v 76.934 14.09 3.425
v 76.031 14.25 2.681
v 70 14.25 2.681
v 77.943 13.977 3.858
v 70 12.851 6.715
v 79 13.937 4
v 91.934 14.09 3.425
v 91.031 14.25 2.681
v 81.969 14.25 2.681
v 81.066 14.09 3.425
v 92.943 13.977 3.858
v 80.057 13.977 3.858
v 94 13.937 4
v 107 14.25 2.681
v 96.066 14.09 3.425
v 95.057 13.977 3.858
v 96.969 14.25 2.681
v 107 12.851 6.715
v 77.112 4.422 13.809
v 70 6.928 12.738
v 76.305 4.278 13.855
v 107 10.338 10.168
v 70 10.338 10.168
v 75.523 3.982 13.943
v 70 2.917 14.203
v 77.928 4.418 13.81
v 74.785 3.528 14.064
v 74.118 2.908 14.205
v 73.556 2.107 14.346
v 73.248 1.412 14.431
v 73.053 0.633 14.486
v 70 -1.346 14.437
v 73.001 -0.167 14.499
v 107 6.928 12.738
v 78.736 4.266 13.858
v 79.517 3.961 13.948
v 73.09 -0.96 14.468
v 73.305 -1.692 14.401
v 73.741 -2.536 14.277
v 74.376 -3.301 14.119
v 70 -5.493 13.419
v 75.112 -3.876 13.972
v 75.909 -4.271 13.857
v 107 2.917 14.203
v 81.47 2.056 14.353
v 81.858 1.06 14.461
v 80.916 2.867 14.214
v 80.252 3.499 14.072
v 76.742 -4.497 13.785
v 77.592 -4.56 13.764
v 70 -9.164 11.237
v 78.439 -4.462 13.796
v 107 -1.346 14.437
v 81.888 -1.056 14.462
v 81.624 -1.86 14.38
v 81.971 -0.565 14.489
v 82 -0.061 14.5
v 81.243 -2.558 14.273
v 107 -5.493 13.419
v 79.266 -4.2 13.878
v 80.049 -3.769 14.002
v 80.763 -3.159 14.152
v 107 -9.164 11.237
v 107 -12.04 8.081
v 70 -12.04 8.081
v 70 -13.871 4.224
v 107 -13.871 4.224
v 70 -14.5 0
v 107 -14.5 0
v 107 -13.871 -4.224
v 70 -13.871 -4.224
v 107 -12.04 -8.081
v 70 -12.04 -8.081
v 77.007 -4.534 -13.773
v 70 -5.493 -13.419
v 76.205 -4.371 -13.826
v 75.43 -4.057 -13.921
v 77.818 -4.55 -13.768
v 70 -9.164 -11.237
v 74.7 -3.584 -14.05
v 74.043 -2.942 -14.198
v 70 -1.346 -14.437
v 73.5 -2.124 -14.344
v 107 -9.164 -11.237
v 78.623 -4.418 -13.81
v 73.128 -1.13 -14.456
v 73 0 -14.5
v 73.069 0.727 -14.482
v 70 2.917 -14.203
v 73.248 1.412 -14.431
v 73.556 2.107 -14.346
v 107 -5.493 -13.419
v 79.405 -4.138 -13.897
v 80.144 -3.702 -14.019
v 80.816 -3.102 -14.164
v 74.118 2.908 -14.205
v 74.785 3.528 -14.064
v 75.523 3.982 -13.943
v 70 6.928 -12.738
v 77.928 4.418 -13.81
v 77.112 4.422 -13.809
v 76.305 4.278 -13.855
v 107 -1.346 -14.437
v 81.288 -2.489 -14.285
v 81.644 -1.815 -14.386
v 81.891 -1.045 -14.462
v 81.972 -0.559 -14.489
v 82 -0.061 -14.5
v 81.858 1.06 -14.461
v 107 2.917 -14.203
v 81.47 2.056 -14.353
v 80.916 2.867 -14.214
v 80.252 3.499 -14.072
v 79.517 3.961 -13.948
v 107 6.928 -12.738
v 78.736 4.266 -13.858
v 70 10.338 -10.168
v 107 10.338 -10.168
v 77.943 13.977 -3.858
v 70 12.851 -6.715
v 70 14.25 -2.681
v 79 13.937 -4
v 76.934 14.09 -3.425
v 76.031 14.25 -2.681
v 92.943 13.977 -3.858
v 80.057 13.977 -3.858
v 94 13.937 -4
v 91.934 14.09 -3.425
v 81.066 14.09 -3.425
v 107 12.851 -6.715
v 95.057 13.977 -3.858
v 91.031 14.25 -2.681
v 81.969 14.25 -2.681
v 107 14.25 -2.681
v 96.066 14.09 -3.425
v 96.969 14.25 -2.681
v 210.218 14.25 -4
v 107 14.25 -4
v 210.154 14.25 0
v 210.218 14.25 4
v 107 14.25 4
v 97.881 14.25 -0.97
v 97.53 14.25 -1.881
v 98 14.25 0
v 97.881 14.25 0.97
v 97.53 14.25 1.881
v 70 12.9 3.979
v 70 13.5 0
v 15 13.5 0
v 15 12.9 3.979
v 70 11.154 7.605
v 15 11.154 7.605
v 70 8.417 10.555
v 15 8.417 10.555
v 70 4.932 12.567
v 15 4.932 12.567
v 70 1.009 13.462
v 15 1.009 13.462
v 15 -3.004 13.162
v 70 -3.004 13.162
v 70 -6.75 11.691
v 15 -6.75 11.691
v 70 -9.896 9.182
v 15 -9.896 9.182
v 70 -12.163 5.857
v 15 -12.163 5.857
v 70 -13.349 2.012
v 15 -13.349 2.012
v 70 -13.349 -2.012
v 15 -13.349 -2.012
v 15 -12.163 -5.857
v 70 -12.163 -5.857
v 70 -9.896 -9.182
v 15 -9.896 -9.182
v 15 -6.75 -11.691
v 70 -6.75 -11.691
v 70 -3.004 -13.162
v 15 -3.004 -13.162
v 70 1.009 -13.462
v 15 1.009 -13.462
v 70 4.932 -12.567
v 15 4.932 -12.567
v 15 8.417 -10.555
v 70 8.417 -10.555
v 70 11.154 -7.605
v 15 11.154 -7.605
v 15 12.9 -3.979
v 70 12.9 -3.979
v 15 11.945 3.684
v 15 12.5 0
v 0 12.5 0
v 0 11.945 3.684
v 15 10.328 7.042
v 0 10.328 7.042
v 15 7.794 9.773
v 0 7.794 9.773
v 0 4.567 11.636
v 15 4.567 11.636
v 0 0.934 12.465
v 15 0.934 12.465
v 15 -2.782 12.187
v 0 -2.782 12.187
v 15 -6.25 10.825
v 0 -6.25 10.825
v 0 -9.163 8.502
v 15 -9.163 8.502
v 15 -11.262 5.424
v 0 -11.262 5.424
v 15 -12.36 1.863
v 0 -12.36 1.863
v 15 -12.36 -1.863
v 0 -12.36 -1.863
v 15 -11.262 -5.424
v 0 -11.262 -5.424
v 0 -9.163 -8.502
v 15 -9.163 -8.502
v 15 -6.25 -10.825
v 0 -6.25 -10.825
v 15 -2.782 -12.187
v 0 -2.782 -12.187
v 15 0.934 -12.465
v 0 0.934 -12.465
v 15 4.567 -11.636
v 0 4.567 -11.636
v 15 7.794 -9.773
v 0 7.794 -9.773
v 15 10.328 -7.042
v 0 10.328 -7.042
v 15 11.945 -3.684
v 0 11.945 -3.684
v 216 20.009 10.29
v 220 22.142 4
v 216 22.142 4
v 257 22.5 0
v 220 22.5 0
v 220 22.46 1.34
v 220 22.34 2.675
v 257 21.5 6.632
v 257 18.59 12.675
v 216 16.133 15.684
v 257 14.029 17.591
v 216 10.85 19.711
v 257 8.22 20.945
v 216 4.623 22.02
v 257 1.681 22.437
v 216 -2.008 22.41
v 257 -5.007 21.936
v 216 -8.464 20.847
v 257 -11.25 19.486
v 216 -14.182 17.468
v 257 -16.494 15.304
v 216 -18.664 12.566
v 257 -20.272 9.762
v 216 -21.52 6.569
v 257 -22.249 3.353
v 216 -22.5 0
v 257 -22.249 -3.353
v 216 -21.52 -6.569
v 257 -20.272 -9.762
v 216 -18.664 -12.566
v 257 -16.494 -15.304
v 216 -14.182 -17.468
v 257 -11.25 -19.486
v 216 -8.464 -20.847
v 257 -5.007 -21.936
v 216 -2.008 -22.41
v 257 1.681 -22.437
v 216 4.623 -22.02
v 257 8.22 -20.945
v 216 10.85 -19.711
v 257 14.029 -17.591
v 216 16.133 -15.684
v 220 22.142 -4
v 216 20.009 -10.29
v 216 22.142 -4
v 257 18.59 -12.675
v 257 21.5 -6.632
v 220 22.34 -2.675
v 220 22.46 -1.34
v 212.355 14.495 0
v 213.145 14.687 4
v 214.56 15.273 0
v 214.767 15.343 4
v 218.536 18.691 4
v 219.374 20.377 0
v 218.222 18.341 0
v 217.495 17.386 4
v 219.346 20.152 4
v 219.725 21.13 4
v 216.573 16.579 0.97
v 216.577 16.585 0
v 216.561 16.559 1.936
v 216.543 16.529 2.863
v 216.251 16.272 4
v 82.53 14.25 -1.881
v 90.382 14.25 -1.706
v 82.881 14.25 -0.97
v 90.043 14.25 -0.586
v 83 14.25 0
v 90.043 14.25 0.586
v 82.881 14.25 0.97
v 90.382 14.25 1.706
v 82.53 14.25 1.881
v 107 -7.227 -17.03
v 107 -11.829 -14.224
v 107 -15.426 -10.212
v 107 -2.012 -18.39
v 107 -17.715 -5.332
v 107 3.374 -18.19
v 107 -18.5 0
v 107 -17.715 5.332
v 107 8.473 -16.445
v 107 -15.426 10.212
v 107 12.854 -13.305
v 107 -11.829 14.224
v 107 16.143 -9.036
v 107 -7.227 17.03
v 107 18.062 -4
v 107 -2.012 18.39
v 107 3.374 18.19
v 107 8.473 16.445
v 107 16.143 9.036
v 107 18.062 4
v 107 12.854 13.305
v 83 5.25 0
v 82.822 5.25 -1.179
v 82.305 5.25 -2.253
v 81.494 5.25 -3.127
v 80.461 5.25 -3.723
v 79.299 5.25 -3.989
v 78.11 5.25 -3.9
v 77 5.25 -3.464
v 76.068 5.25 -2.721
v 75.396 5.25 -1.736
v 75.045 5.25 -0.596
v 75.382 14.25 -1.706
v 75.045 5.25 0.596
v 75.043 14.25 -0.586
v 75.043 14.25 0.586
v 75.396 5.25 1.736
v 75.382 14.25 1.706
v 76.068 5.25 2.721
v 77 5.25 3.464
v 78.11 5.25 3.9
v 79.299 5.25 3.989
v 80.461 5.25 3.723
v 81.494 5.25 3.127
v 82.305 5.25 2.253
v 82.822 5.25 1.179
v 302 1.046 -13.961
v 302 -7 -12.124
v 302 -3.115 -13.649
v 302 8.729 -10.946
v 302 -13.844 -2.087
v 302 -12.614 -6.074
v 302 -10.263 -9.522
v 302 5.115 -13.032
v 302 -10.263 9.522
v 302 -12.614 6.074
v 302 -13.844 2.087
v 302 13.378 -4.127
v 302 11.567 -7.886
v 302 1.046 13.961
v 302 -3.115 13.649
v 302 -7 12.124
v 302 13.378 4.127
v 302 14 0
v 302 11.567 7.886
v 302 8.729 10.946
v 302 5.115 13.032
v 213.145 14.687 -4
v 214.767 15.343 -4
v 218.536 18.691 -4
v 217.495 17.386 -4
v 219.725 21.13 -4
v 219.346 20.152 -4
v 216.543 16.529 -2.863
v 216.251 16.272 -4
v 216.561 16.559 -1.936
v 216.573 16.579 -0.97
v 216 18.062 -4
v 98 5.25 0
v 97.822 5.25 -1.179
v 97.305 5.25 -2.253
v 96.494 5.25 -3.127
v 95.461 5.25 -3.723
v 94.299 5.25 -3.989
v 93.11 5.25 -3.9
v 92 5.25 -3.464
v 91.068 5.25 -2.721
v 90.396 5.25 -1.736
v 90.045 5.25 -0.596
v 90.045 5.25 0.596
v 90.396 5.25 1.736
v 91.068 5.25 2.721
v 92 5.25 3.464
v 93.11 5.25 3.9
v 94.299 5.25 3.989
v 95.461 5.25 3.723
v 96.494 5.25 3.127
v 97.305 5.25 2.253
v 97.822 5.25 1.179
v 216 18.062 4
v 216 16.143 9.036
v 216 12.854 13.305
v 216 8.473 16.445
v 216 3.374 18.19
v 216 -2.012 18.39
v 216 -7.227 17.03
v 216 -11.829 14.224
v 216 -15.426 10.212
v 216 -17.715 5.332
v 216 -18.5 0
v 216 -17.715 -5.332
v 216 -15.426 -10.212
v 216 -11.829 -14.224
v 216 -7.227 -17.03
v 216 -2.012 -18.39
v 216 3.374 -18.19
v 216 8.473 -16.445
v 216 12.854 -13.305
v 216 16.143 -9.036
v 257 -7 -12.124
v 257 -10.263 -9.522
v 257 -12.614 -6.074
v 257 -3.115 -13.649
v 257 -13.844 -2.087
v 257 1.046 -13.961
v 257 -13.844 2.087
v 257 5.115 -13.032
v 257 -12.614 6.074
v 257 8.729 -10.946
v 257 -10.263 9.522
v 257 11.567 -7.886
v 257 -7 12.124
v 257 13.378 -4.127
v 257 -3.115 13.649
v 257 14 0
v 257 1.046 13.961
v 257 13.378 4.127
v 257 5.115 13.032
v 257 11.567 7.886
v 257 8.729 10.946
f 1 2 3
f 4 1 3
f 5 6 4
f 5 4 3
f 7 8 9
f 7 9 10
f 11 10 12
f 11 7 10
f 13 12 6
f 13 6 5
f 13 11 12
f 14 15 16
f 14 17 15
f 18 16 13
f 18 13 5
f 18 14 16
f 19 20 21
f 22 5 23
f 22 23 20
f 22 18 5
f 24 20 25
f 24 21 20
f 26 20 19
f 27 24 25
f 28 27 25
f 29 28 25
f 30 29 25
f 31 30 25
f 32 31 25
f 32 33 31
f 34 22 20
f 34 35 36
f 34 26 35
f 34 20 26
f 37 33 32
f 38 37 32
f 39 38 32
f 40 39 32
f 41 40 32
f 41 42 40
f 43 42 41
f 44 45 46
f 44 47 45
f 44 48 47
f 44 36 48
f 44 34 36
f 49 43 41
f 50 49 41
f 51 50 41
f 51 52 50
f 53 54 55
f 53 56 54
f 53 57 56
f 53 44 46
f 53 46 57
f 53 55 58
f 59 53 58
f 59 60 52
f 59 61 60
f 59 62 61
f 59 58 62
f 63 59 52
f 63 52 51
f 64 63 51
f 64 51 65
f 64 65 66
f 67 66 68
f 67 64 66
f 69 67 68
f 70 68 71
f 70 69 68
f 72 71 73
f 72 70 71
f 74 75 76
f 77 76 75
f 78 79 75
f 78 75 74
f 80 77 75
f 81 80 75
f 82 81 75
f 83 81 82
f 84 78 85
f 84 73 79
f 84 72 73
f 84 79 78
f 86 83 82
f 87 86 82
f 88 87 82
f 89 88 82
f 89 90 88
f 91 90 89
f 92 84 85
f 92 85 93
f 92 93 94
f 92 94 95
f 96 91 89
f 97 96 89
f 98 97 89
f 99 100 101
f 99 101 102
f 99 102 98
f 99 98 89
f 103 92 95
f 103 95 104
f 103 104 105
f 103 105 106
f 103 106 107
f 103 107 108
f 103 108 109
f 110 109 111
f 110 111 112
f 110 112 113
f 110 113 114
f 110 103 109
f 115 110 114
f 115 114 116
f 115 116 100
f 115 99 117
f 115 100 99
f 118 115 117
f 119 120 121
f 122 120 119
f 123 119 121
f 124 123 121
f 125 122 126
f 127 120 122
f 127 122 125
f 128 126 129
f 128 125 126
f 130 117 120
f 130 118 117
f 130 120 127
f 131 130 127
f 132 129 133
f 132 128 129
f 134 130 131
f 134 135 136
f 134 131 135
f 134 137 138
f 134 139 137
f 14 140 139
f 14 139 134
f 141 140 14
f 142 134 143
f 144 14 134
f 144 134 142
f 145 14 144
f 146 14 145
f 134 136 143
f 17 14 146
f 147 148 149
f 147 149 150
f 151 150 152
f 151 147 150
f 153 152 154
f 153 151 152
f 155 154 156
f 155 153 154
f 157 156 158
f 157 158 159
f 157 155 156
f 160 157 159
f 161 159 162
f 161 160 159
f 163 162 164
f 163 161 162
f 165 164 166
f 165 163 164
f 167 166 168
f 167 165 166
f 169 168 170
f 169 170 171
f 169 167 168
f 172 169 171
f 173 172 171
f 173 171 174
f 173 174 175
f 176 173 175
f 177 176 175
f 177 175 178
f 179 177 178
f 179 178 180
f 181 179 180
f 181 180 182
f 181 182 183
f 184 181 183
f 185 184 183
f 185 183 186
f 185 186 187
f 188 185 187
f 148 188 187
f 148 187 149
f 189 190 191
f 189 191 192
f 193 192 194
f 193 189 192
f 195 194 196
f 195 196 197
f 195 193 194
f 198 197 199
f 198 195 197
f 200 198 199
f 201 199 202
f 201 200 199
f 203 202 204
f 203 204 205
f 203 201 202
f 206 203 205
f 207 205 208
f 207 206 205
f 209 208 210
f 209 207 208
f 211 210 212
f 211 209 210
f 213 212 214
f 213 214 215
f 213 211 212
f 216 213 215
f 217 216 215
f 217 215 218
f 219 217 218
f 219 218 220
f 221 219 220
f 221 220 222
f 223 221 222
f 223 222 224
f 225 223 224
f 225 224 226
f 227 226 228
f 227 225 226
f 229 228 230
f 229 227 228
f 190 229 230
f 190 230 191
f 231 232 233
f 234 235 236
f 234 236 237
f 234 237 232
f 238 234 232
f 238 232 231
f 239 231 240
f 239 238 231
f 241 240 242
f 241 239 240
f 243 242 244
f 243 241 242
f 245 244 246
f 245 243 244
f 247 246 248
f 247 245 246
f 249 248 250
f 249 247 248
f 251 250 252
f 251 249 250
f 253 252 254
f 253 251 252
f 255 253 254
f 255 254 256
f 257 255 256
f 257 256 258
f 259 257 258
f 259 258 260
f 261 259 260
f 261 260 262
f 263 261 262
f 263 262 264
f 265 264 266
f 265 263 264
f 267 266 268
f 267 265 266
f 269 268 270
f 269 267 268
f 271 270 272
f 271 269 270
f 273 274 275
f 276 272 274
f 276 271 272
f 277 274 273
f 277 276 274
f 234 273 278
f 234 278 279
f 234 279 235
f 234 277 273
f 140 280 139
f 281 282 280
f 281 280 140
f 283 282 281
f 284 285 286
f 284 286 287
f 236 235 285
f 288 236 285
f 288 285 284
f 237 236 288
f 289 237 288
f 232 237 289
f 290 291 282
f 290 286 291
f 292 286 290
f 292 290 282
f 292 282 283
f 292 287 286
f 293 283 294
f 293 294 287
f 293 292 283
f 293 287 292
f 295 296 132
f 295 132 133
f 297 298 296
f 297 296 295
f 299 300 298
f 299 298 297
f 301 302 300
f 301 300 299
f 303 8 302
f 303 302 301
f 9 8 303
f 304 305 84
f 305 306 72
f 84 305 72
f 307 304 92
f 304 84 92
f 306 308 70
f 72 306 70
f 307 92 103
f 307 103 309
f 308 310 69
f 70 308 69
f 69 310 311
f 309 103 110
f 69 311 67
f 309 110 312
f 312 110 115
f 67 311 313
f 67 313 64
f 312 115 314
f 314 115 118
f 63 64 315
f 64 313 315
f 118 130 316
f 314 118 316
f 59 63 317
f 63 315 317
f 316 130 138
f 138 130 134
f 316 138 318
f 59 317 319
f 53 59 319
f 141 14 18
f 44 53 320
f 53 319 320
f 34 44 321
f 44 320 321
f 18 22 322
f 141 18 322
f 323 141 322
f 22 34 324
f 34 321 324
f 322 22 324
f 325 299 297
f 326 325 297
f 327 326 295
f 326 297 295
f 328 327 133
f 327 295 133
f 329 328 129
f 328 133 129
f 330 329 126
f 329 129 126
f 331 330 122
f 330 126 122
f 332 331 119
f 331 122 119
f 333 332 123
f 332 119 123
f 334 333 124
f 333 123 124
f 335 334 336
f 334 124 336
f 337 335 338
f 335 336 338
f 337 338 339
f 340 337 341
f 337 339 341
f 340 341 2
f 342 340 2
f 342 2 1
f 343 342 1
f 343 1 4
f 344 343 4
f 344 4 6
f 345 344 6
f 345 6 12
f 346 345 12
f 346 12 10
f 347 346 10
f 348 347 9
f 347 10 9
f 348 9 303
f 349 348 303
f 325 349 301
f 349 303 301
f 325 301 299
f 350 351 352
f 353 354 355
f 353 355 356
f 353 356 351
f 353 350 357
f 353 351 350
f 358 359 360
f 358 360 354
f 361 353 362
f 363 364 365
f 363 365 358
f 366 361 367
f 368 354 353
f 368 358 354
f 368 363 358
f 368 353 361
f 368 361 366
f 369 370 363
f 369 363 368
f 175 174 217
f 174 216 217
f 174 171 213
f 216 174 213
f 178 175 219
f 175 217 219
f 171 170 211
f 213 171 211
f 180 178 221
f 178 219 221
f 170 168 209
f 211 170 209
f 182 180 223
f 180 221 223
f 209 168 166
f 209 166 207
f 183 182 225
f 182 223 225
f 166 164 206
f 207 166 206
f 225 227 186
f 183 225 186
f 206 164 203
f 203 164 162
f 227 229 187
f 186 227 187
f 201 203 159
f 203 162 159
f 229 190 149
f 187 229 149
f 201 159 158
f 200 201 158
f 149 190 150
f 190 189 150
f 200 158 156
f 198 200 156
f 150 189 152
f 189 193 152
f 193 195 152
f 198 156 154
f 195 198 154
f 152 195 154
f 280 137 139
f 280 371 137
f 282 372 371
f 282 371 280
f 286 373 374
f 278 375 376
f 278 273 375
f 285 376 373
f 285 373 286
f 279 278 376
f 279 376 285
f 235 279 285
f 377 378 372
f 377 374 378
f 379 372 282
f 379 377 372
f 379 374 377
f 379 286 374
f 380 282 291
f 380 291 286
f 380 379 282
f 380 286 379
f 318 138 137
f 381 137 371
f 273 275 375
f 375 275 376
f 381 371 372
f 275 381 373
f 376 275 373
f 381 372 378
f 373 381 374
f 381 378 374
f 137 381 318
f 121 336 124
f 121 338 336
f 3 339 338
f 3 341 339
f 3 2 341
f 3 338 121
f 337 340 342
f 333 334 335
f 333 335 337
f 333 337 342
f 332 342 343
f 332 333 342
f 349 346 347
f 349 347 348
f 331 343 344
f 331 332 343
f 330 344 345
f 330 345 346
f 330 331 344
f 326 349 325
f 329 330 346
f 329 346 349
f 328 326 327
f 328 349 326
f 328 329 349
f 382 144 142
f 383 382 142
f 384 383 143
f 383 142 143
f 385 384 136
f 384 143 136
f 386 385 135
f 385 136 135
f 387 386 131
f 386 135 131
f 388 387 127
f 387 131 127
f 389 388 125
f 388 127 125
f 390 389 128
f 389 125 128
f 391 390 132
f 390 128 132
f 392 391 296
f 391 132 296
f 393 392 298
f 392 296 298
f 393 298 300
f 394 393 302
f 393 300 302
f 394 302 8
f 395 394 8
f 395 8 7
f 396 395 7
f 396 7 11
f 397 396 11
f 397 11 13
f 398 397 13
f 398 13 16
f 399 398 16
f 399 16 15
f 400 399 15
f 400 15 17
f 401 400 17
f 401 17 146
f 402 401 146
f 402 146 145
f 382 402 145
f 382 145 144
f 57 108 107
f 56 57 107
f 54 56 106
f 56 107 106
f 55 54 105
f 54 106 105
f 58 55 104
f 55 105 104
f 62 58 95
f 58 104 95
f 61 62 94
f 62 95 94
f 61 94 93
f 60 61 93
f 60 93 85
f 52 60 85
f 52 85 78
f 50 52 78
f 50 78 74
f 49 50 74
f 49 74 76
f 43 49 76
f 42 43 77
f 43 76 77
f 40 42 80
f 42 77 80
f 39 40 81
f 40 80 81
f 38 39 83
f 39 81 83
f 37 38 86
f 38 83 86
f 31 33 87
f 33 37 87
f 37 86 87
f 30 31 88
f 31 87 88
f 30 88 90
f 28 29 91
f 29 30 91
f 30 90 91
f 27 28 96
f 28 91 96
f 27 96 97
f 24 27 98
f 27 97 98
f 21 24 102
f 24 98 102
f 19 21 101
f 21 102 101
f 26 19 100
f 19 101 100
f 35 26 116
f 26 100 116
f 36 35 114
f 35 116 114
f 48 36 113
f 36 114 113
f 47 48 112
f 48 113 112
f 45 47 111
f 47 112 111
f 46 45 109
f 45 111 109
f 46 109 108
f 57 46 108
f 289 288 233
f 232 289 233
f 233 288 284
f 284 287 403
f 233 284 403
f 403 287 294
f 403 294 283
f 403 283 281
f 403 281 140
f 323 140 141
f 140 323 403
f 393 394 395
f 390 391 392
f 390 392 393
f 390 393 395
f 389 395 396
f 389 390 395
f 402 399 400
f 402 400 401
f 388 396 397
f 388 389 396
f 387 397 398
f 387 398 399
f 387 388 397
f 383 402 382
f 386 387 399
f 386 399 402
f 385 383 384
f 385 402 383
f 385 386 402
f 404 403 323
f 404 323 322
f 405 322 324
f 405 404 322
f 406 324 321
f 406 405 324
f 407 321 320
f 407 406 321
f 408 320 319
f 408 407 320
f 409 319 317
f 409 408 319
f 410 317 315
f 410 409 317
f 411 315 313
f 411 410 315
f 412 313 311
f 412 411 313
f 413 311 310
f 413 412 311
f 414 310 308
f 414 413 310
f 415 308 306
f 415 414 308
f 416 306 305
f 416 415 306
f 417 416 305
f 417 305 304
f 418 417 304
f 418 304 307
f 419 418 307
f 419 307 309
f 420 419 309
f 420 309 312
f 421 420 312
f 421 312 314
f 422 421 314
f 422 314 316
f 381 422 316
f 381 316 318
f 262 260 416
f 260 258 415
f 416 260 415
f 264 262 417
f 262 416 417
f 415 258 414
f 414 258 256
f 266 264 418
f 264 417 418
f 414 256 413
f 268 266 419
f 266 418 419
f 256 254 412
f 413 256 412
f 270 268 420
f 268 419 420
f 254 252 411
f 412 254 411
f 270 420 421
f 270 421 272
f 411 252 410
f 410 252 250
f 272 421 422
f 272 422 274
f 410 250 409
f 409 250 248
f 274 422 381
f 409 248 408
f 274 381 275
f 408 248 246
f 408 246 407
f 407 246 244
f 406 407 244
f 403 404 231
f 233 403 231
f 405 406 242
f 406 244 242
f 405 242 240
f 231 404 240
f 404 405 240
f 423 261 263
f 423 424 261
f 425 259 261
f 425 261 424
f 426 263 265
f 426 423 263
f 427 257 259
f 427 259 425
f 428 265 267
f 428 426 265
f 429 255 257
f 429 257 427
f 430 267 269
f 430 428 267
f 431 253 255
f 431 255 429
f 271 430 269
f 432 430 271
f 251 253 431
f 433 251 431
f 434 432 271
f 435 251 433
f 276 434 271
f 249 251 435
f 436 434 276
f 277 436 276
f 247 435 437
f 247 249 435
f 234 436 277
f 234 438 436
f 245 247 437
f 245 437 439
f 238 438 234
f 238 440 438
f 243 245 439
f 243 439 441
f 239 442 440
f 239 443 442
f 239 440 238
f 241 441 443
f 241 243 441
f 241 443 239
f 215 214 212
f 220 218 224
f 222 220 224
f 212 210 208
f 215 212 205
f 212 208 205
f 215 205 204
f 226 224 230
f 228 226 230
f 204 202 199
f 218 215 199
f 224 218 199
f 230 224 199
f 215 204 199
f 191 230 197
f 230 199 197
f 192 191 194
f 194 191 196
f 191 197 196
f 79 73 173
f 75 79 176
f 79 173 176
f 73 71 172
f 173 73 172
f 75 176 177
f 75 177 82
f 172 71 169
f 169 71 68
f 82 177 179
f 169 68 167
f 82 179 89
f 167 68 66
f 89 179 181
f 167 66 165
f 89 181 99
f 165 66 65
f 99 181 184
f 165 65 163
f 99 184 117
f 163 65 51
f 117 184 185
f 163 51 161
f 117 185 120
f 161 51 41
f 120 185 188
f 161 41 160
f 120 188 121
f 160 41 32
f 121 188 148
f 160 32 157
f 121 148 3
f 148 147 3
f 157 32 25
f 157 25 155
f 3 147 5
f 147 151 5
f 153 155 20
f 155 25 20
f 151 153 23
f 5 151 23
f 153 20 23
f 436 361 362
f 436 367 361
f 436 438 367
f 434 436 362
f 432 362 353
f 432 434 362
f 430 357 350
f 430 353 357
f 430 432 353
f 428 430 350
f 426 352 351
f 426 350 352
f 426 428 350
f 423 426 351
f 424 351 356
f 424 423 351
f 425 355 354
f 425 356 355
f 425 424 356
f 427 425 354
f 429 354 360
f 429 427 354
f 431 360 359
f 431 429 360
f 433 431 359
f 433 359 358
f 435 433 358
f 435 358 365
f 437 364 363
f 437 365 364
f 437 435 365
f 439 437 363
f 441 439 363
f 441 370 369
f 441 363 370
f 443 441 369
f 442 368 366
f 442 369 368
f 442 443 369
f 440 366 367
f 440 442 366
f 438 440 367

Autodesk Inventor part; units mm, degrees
sketch "Sketch1" plane through (0, 0, 0) normal (0, 0, 1) x (1, 0, 0)
  line L0 (0, 0) -> (302, 0)
  line L1 (0, 0) -> (0, 12.5)
  line L2 (0, 12.5) -> (15, 12.5)
  line L3 (15, 12.5) -> (15, 13.5)
  line L4 (15, 13.5) -> (70, 13.5)
  line L5 (70, 13.5) -> (70, 14.5)
  line L6 (70, 14.5) -> (107, 14.5)
  line L7 (107, 14.5) -> (107, 18.5)
  line L8 (107, 18.5) -> (216, 18.5)
  line L9 (216, 18.5) -> (216, 22.5)
  line L10 (302, 0) -> (302, 14)
  line L11 (302, 14) -> (257, 14)
  line L12 (216, 22.5) -> (257, 22.5)
  line L13 (257, 22.5) -> (257, 14)
  dimension "d0" = 302
  dimension "d1" = 12.5
  dimension "d2" = 15
  dimension "d3" = 1
  dimension "d4" = 55
  dimension "d5" = 1
  dimension "d6" = 37
  dimension "d7" = 4
  dimension "d8" = 109
  dimension "d9" = 4
  dimension "d10" = 14
  dimension "d11" = 45
revolve "Revolution1" add sketch "Sketch1" angle 360 about axis through (0, 0, 0) along (1, 0, 0)
ref_plane "Work Plane1" through (0, 17.5, 0) normal (0, 1, 0) x (-1, 0, 0)
ref_plane "Work Plane2" through (0, 14.25, 0) normal (0, 1, 0) x (-1, 0, 0)
sketch "Sketch3" plane through (0, 14.25, 0) normal (0, 1, 0) x (-1, 0, 0)
  line L0 (-70, -4) -> (-220, -4)
  line L1 (-220, -4) -> (-220, 4)
  line L2 (-216, 22.5) -> (-216, -22.5) projected
  line L3 (-220, 4) -> (-70, 4)
  line L4 (-70, -4) -> (-70, 4)
  line L5 (-70, 14.5) -> (-70, -14.5) projected
  point P0 (0, 0)
  dimension "d17" = 150
  dimension "d18" = 8
  dimension "d19" = 150
extrude "Extrusion1" cut sketch "Sketch3" along normal blind 10
fillet "Fillet1" radius 10 1 edges at (220, 14.25, 0)
sketch "Sketch4" plane through (0, 14.25, 0) normal (0, 1, 0) x (1, 0, 0)
  circle A0 centre (79, 0) radius 4
  circle A1 centre (94, 0) radius 4
  line L0 (70, -2.681) -> (70, 2.681) projected
  point P0 (0, 0)
  dimension "d23" = 8
  dimension "d24" = 8
extrude "Extrusion2" cut sketch "Sketch4" against normal blind 9
ref_plane "Work Plane3" through (0, 0, -14.5) normal (0, 0, 1) x (1, 0, 0)
sketch "Sketch5" plane through (0, 0, -14.5) normal (0, 0, 1) x (1, 0, 0)
  circle A0 centre (77.4995, -0.0611) radius 4.5
  line L0 (70, -14.5) -> (70, 14.25) projected
  point P0 (0, 0)
  dimension "d31" = 9
extrude "Extrusion3" cut sketch "Sketch5" along normal blind 30
properties part number "eixo 2"
